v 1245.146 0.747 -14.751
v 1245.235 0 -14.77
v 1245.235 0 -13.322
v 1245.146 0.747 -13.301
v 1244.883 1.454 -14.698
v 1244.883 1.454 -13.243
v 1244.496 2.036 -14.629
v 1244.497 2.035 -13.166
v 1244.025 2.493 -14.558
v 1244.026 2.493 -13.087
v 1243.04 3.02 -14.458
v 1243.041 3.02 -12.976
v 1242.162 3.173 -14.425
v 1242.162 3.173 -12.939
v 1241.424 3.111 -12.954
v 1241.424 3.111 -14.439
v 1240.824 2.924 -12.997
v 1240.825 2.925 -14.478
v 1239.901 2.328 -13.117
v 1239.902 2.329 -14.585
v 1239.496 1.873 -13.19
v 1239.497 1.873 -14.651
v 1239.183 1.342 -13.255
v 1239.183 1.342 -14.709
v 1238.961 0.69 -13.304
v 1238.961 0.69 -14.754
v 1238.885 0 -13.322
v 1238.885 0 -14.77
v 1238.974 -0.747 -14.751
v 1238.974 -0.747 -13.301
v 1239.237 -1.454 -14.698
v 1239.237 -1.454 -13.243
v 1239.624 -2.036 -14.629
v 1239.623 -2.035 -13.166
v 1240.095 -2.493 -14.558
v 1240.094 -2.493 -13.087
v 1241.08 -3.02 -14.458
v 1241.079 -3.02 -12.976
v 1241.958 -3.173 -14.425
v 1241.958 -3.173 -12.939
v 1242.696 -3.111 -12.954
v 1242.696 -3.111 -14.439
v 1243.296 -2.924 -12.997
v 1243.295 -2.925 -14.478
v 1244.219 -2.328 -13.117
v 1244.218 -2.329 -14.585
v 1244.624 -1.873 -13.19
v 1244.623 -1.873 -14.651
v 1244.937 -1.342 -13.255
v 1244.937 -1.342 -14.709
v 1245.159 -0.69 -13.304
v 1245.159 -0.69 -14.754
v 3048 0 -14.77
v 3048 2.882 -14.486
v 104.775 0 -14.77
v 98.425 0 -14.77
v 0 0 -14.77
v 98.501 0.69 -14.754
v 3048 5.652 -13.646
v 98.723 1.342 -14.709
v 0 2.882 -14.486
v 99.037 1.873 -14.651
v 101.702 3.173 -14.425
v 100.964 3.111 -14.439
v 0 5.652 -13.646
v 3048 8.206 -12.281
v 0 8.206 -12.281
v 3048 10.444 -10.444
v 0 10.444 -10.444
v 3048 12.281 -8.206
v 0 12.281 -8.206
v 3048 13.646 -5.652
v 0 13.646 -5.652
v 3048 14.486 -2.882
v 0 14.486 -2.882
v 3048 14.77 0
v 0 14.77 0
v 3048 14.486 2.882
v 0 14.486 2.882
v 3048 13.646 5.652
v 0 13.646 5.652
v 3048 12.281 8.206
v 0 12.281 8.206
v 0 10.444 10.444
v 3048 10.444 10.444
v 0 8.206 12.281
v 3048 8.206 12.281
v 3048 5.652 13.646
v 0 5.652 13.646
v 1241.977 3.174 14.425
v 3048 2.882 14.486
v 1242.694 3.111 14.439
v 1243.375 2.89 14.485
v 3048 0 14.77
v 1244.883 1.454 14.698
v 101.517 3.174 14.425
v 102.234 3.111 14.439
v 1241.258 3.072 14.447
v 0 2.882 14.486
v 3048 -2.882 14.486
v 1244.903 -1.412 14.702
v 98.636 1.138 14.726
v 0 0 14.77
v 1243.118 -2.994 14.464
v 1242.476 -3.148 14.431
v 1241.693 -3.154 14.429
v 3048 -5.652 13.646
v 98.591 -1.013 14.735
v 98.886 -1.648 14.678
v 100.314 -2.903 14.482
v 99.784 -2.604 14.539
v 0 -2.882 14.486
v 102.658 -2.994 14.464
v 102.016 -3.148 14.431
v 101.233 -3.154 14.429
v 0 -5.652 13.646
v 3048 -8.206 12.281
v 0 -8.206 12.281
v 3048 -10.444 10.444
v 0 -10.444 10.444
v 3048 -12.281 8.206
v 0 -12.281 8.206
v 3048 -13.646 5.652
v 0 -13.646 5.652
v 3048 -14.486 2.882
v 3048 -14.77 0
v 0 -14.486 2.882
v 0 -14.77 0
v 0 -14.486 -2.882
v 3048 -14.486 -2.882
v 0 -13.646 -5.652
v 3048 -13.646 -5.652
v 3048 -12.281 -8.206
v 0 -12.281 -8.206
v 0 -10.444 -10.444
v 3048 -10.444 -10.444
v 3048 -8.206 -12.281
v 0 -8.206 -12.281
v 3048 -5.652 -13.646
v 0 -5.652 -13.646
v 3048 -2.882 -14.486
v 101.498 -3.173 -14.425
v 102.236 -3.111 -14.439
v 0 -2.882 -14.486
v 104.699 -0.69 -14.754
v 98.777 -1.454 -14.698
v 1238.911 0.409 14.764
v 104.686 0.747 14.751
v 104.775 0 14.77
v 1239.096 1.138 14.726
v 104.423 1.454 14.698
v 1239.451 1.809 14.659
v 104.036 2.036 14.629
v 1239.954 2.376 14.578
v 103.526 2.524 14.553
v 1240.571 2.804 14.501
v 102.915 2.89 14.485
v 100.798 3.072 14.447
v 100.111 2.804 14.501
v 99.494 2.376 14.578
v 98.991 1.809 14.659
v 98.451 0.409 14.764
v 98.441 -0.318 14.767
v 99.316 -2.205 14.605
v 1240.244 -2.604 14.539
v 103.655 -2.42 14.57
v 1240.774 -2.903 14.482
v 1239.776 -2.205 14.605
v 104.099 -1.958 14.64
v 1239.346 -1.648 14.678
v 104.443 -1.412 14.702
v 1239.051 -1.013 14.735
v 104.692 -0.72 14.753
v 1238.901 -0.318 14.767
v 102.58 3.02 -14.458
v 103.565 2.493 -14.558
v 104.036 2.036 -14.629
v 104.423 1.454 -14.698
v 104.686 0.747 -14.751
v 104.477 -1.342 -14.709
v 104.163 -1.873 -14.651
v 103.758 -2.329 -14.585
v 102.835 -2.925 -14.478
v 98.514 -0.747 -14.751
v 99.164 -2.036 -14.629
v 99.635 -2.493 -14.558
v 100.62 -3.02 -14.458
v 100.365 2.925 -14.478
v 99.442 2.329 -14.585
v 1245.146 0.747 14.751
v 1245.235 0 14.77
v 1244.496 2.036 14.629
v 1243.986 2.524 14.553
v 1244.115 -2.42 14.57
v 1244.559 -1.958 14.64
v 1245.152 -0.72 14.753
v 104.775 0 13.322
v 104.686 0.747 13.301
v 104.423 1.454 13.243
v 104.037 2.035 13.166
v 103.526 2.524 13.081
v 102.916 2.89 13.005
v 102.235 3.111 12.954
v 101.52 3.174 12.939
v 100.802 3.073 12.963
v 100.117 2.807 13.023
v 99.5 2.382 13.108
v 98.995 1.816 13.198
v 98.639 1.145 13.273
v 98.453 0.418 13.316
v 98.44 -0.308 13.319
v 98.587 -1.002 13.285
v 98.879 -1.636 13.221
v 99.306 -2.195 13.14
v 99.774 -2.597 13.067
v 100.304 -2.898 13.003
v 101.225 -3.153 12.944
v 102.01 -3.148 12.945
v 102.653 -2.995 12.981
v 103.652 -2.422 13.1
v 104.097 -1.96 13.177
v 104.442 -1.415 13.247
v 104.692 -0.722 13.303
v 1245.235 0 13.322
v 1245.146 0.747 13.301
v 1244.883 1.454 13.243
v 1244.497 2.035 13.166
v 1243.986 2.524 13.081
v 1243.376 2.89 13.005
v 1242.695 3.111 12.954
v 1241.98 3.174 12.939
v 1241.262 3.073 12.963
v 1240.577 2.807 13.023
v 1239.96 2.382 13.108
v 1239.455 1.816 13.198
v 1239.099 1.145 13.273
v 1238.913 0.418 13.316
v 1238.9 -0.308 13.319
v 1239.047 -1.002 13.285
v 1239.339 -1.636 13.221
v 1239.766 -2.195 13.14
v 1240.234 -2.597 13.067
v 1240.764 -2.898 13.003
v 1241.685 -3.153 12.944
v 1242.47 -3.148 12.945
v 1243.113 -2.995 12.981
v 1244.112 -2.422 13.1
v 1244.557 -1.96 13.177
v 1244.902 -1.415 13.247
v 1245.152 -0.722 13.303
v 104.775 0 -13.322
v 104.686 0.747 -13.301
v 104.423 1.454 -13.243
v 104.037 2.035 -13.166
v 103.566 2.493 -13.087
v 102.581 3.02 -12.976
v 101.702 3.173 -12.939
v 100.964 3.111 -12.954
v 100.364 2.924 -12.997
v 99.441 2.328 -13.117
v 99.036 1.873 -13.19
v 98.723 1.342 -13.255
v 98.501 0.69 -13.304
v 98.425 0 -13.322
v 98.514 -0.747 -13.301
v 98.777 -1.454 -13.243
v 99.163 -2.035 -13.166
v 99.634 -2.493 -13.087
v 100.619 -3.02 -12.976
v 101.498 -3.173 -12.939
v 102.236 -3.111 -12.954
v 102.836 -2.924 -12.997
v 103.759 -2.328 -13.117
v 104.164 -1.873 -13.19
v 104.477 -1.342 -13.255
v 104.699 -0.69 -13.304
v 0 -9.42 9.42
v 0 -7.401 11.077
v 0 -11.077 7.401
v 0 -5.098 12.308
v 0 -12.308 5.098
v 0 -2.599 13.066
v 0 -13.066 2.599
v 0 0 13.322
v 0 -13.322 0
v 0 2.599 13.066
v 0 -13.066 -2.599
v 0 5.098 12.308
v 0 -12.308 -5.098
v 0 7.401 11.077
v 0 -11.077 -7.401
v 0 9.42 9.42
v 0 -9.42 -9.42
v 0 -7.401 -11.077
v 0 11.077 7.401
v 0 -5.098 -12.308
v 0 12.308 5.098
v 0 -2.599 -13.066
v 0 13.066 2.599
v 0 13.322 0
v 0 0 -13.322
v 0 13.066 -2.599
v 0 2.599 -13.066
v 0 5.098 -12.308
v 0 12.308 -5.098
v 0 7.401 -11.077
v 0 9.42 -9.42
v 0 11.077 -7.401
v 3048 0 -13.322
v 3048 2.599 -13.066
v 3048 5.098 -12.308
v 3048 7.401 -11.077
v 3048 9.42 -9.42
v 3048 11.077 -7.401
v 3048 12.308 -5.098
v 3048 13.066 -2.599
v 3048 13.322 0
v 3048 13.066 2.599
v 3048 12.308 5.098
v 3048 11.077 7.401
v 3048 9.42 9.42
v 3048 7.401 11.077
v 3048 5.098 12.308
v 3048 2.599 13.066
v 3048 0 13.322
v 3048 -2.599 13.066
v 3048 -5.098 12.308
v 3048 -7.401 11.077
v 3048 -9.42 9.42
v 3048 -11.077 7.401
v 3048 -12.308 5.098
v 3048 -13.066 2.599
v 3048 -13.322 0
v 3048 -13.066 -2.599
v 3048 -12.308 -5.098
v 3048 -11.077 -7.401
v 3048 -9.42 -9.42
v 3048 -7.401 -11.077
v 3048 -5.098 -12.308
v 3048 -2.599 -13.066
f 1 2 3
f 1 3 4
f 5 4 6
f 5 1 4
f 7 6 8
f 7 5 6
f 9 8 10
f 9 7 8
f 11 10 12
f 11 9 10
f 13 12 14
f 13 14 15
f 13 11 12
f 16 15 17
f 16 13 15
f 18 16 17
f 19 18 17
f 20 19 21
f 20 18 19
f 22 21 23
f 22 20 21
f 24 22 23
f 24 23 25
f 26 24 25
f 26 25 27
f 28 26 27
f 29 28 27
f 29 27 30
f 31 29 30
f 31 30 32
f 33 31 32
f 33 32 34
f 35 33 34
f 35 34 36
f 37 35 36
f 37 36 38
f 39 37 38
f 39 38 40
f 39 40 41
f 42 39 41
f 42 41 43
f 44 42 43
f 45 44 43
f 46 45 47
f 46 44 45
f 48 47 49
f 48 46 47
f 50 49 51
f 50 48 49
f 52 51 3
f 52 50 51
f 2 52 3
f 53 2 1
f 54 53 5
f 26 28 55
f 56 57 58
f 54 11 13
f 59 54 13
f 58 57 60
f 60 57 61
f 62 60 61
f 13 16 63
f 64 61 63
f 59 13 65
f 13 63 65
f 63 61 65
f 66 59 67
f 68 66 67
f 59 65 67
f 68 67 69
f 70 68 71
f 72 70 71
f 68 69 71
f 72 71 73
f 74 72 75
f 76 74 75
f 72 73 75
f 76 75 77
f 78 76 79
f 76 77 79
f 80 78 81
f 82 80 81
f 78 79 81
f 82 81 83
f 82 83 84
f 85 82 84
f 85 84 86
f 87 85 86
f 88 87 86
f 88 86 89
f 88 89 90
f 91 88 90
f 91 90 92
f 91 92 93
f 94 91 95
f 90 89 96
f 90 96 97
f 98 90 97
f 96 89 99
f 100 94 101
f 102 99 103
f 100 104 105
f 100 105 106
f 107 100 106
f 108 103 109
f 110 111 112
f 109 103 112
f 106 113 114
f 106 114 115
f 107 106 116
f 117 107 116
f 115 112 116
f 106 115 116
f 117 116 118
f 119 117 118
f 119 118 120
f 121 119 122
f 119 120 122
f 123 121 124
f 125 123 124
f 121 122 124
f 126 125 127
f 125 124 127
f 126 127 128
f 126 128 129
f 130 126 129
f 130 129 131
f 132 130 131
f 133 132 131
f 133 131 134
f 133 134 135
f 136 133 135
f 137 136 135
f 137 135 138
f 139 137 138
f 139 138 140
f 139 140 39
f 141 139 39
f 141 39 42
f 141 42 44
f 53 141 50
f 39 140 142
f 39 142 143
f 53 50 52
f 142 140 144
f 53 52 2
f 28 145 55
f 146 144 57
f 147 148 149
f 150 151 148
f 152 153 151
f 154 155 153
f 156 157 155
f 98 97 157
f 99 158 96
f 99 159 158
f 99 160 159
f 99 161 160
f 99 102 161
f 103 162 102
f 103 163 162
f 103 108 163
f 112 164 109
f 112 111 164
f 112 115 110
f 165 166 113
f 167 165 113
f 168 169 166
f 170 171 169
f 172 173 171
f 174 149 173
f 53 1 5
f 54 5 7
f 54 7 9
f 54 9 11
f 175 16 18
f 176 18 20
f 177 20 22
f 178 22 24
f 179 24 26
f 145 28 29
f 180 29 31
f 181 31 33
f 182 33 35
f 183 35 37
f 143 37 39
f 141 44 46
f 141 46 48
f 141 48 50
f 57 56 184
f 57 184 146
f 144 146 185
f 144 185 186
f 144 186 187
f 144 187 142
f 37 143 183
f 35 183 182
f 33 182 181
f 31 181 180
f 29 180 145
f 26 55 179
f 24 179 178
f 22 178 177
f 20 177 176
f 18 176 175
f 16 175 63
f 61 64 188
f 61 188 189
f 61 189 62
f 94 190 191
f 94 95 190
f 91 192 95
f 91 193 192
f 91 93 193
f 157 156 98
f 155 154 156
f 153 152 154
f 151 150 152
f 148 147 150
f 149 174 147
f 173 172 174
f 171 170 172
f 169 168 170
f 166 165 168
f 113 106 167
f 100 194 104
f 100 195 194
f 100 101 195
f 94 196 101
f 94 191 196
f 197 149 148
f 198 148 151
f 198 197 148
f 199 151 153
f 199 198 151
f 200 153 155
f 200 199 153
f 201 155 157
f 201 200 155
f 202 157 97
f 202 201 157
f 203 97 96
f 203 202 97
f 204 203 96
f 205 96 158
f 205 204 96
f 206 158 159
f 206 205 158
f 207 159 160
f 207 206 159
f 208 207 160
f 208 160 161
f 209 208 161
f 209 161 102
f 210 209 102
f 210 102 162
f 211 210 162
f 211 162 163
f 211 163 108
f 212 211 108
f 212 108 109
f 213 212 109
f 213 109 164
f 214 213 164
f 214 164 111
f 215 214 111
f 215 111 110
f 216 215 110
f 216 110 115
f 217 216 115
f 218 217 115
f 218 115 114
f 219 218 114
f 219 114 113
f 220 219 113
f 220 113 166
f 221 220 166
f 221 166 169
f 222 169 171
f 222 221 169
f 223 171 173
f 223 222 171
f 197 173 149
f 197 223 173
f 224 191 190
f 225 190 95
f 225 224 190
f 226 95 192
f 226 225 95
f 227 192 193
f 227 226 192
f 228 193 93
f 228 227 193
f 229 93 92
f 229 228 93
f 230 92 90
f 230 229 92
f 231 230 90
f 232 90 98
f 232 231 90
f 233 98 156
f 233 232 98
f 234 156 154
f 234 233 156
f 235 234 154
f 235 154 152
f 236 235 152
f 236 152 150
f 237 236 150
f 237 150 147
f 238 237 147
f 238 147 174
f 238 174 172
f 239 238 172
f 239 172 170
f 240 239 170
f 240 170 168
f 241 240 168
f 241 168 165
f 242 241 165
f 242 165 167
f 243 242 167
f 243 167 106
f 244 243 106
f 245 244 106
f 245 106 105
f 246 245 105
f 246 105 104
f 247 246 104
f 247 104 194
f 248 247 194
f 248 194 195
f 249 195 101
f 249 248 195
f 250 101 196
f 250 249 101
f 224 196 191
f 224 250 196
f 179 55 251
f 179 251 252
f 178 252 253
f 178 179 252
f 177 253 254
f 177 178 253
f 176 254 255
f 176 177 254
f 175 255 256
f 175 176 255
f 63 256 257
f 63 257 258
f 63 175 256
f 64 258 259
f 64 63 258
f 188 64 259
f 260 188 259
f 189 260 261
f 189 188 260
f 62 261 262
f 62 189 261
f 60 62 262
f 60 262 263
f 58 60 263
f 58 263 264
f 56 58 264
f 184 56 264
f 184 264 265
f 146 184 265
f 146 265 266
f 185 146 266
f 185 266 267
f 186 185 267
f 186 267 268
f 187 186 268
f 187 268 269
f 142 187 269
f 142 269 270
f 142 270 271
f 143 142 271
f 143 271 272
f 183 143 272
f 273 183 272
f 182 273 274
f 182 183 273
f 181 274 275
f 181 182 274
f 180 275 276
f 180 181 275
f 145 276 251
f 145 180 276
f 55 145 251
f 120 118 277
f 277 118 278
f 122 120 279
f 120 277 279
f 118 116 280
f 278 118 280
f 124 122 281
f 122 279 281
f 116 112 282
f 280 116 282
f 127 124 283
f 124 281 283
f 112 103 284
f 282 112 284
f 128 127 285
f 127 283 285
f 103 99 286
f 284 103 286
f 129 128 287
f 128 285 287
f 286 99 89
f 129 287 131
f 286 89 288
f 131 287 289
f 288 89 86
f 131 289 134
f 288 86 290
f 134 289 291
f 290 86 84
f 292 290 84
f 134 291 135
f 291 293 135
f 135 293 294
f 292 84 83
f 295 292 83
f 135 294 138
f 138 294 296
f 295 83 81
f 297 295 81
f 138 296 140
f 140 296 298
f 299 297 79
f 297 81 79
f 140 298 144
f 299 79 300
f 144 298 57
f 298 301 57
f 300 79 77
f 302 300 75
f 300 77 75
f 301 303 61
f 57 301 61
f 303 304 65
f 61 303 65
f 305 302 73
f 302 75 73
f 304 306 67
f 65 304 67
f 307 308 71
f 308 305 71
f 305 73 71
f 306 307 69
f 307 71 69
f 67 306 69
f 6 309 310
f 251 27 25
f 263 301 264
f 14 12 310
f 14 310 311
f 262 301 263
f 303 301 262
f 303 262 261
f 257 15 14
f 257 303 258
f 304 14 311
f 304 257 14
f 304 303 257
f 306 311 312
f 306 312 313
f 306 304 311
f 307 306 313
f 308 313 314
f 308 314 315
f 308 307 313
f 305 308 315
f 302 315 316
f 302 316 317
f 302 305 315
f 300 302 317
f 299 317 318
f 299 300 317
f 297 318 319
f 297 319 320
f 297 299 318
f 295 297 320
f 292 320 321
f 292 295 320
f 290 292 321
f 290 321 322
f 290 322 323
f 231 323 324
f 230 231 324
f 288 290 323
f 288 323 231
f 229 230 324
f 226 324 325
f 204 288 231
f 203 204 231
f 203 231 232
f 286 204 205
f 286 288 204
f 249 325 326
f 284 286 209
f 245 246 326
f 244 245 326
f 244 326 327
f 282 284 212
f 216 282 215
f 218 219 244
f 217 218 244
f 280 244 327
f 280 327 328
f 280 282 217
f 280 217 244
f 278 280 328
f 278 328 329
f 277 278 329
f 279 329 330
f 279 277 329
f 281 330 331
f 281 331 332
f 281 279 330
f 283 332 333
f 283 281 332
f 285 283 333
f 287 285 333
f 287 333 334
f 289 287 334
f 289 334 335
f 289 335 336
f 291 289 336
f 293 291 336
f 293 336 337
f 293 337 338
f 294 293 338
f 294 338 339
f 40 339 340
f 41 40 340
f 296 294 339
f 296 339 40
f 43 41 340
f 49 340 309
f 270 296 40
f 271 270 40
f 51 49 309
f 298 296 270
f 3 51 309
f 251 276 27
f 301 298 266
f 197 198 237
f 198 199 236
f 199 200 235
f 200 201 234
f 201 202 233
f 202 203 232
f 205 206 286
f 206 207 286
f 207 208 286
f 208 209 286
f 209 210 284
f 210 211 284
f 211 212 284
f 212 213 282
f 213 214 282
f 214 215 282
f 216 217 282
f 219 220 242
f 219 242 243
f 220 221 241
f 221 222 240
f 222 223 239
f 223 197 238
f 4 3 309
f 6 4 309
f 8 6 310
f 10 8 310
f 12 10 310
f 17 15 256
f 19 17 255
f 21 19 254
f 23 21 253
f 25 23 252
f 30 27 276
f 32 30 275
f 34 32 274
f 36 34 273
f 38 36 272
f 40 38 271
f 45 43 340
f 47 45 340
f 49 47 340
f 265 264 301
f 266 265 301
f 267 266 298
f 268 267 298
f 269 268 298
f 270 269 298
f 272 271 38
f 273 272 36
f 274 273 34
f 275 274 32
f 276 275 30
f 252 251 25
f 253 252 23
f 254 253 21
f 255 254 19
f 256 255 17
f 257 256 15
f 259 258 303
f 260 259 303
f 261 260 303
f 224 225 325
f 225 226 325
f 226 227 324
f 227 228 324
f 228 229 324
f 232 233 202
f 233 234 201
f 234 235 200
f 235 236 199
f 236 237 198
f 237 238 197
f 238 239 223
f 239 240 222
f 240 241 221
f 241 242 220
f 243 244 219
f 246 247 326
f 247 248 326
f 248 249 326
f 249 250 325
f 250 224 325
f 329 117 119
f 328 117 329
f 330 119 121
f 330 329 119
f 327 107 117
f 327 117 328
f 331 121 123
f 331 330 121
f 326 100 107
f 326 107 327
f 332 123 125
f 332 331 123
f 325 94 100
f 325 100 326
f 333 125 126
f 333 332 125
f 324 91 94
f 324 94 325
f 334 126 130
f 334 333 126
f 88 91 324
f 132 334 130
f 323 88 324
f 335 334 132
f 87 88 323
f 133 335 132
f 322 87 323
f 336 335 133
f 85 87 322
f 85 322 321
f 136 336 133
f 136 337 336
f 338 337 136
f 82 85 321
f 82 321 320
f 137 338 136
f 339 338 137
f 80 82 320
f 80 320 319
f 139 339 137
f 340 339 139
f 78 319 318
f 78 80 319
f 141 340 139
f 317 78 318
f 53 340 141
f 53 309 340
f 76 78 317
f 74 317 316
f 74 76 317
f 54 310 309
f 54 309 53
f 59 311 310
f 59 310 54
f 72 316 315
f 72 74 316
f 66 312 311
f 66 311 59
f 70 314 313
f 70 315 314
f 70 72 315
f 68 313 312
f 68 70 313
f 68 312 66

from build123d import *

# Parameters (mm, degrees)
SKETCH3_R               = 14.7701
SKETCH3_R_2             = 13.3223
BOSS_EXTRUDE1_DEPTH     = 3048
CUT_EXTRUDE1_DEPTH      = 3049.071572603
CUT_EXTRUDE1_DEPTH_BACK = 3049.071572603
SKETCH6_R               = 3.175


with BuildPart() as part:
    # Sketch3 → Boss-Extrude1 (new body)
    with BuildSketch(Plane(origin=(0, 0, 0), x_dir=(0, 0, -1), z_dir=(1, 0, 0))):
        Circle(SKETCH3_R)
        Circle(SKETCH3_R_2, mode=Mode.SUBTRACT)
    extrude(amount=BOSS_EXTRUDE1_DEPTH)

    # Sketch6 → Cut-Extrude1 (cut, two sides: drawn at the far end of the back side and taken through both)
    with BuildSketch(Plane.XY.offset(-CUT_EXTRUDE1_DEPTH_BACK)):
        with Locations((101.6, 0)):
            Circle(SKETCH6_R)
        with Locations((1242.06, 0)):
            Circle(SKETCH6_R)
    extrude(amount=CUT_EXTRUDE1_DEPTH + CUT_EXTRUDE1_DEPTH_BACK, mode=Mode.SUBTRACT)


solid = part.part
